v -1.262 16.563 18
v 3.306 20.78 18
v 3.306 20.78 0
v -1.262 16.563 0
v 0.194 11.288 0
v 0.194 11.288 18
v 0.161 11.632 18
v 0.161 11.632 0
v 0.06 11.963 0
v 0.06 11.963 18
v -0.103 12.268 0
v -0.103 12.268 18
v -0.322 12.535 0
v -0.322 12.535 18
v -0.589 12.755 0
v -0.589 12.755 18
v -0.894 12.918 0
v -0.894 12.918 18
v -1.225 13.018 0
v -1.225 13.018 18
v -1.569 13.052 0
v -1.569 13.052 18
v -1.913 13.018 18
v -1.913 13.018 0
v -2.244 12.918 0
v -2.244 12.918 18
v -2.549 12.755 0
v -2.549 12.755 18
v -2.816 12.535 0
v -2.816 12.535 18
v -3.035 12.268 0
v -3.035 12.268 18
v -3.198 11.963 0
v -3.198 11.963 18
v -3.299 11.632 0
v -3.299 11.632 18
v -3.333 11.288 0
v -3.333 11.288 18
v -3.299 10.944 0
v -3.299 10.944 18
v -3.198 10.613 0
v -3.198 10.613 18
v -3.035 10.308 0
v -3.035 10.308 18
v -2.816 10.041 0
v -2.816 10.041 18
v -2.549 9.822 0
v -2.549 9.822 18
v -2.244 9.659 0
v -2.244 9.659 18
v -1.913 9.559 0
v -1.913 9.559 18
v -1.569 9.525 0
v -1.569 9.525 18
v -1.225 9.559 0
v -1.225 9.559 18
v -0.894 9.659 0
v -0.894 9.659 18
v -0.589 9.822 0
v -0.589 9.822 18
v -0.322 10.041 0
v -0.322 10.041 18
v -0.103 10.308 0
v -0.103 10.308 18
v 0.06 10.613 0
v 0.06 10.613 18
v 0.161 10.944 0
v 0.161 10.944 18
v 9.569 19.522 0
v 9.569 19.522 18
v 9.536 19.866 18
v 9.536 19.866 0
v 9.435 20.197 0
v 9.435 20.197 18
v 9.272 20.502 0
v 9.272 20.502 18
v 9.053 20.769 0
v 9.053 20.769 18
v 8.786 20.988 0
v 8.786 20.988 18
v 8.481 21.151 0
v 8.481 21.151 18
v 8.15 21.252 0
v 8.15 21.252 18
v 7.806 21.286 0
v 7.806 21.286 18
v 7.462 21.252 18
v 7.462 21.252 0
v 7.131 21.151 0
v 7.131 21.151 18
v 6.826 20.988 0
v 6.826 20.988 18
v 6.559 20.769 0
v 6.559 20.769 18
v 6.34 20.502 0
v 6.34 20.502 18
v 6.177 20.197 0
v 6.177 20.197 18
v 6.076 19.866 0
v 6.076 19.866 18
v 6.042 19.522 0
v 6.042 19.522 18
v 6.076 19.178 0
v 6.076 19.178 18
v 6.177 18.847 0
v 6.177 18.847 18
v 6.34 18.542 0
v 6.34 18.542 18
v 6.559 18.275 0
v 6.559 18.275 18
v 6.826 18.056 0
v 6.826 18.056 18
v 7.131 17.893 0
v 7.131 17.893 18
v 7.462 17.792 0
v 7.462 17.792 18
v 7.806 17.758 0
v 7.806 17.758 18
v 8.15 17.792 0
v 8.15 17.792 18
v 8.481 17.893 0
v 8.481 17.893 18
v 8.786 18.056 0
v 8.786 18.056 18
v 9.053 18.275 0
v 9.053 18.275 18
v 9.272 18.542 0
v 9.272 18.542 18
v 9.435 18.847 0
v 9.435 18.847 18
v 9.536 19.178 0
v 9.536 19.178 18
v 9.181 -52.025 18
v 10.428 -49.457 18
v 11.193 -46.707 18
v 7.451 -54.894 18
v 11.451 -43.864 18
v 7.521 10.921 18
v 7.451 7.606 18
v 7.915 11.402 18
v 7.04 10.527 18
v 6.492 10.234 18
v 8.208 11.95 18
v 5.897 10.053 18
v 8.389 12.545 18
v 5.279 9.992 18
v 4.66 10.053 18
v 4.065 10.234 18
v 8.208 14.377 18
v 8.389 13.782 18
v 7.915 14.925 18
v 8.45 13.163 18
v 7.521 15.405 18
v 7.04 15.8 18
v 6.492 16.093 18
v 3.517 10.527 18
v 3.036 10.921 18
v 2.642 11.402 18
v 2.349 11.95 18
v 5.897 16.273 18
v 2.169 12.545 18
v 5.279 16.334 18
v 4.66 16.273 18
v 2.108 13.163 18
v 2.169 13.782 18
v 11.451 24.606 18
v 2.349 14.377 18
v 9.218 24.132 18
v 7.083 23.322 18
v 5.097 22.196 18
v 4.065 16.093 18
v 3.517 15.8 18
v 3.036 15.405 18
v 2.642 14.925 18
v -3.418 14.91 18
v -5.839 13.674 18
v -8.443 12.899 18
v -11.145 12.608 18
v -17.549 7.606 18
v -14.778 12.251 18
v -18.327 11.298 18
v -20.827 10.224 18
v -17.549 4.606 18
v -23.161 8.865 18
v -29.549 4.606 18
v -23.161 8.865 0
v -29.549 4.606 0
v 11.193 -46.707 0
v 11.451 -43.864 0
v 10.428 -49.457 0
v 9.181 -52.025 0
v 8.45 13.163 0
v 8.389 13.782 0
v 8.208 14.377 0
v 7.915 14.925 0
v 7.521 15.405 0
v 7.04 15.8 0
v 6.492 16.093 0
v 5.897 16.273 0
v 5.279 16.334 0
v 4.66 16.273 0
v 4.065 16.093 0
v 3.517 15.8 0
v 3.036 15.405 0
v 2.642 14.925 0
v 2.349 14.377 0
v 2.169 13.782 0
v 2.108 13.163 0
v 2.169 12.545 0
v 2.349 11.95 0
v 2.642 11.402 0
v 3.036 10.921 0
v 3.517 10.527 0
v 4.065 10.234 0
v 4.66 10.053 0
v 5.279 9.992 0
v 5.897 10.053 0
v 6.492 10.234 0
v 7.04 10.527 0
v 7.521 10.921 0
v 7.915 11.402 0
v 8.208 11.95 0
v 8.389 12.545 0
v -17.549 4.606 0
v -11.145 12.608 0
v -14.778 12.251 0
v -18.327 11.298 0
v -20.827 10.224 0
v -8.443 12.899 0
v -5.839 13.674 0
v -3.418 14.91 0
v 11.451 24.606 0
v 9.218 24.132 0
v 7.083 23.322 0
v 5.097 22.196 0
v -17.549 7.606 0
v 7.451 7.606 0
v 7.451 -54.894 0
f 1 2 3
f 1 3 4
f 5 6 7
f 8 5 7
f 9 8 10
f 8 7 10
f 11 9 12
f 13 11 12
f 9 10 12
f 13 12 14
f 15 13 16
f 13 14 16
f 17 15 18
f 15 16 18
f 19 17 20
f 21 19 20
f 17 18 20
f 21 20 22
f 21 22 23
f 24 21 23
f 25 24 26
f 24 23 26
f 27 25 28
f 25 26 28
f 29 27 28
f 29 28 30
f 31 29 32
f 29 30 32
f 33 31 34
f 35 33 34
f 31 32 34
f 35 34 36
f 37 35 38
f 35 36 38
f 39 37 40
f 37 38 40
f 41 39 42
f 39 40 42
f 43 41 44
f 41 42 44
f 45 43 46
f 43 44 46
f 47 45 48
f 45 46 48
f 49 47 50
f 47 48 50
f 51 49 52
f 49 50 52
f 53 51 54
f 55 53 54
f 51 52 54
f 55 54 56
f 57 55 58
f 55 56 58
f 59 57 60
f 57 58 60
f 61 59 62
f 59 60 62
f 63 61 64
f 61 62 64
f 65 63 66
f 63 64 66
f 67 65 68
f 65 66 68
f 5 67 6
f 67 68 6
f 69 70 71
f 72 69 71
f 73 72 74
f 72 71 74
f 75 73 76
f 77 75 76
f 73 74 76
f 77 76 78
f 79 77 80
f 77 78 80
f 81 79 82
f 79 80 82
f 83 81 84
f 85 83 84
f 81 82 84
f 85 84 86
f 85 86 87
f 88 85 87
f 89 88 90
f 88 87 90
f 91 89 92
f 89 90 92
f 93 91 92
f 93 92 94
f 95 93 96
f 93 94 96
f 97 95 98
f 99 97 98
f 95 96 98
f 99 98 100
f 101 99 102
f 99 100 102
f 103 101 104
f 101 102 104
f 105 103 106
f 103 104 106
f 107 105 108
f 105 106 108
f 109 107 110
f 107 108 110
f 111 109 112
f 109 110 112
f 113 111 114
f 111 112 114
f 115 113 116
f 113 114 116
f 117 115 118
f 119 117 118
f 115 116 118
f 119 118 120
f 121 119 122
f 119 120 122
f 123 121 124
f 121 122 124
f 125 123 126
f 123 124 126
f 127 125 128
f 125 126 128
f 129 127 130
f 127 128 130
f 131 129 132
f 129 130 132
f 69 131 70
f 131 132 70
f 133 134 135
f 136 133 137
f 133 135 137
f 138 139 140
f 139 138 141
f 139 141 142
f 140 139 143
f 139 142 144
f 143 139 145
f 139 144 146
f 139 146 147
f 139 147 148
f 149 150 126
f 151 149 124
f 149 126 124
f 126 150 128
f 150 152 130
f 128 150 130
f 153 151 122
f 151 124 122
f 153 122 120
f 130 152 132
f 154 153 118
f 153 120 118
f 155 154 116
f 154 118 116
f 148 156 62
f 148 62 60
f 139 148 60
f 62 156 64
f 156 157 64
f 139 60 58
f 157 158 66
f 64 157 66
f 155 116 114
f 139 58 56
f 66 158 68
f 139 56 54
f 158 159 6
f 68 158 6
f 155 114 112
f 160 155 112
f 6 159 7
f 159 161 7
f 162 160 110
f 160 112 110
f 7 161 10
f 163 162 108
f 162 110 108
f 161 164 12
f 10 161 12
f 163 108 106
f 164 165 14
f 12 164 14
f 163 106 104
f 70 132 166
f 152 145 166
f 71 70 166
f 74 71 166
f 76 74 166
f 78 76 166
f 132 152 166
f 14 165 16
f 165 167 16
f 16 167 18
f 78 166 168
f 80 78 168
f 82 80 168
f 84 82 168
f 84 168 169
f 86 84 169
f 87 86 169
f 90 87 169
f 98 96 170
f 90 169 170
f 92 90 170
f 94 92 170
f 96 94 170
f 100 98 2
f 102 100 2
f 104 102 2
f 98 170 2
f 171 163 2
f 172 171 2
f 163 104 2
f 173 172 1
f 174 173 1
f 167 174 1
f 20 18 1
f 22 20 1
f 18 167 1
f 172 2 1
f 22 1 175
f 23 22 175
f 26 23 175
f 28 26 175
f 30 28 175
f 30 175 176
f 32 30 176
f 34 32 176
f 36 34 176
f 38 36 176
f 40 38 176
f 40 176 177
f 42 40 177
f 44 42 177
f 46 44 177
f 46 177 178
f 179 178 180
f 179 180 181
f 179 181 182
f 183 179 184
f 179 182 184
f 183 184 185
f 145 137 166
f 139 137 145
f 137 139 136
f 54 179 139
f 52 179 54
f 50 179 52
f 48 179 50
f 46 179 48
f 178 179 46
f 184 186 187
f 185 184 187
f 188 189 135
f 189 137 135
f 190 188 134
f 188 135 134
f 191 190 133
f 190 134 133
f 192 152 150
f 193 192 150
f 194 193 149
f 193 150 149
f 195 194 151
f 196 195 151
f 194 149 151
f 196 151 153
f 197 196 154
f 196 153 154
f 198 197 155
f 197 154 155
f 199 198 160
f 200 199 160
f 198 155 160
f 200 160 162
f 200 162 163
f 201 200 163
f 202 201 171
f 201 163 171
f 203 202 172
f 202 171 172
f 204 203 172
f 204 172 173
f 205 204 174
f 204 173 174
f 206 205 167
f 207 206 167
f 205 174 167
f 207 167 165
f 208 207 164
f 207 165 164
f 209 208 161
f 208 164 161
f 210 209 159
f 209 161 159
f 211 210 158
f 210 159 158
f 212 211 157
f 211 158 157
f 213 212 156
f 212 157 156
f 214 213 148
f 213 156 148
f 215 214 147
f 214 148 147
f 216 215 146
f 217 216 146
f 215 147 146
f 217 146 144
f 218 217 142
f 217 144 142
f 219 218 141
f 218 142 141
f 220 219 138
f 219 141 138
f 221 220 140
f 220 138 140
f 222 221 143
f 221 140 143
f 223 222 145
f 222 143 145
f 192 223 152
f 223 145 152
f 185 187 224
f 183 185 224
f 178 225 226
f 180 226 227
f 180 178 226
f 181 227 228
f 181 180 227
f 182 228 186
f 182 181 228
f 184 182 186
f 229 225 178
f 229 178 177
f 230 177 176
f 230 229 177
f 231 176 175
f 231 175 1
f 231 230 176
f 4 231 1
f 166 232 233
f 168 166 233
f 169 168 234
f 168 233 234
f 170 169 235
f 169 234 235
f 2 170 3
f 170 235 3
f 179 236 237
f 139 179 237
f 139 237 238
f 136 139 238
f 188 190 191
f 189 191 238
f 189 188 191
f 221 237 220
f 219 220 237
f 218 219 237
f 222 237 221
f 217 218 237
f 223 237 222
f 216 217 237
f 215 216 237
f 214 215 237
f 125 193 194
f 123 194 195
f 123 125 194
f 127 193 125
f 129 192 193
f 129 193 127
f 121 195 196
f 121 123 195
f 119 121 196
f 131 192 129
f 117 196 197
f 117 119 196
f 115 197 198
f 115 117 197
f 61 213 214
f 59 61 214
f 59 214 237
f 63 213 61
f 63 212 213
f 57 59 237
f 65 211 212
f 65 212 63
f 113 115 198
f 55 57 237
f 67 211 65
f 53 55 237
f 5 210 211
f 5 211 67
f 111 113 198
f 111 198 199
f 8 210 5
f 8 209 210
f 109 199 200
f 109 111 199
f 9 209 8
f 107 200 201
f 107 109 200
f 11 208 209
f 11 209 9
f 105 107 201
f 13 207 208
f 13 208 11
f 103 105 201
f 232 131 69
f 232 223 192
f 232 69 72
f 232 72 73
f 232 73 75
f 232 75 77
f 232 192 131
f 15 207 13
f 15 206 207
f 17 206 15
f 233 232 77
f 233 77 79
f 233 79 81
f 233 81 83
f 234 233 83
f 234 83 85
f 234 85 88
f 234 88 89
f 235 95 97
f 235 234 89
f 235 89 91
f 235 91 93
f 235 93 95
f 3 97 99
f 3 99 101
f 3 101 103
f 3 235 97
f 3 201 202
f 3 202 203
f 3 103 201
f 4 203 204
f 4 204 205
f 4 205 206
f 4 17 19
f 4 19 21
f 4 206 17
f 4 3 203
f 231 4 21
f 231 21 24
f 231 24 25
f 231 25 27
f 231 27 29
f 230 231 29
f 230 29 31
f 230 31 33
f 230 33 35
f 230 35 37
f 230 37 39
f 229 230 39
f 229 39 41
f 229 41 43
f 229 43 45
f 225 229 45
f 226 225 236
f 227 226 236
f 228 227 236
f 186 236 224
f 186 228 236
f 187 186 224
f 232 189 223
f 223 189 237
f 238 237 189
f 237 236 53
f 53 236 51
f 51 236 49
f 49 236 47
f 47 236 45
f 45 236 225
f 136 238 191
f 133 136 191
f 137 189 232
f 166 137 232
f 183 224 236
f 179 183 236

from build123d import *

# Parameters (mm, degrees)
F1_DEPTH    = 18
F2_T1_DEPTH = 18
F2_T3_DEPTH = 46.2017417965
F3_R        = 22.3056916506
F4_R        = 15.8040911287
F5_R        = 1.7635852265
F5_R_2      = 3.1709752344
F6_DEPTH    = 18


# Not quite as in the source:
# - a fillet or chamfer that OpenCascade refuses, or shapes differently, is made with other operations: its cross-section is extruded or revolved along the edge and cut away or added


with BuildPart() as f1:
    # F0 (on Top) → F1 (new body)
    with BuildSketch(Plane.XY):
        Polygon((-17.5491029148, 7.6061424899), (7.4508970852, 7.6061424899), (7.4508970852, -54.8938575101), (11.4508970852, -48.259973526), (11.4508970852, 24.6061424899), (7.4508970852, 24.6061424899), (-5.5491029148, 12.6061424899), (-17.5491029148, 12.6061424899), (-29.5491029148, 4.6061424899), (-17.5491029148, 4.6061424899), align=None)
    extrude(amount=F1_DEPTH)

    # F2: fillet of radius 14.9219158343 on 2 edges, made by hand

    # F2_s2 → F2_t1 (join)
    with BuildSketch(Plane.XY):
        with BuildLine():
            ThreePointArc((-11.3833307845, 12.6061424899), (-5.9496574254, 13.6306209347), (-1.2620921794, 16.5633831687))
            Line((-1.2620921794, 16.5633831687), (-5.5491029148, 12.6061424899))
            Line((-5.5491029148, 12.6061424899), (-11.3833307845, 12.6061424899))
        make_face()
    extrude(amount=F2_T1_DEPTH)

    # F2_s4 → F2_t3 (cut)
    with BuildSketch(Plane.XY.offset(-14.1008708982)):
        with BuildLine():
            ThreePointArc((11.4508970852, 24.6061424899), (7.0833751355, 23.32182366), (3.3063496819, 20.7804064253))
            Line((3.3063496819, 20.7804064253), (7.4508970852, 24.6061424899))
            Line((7.4508970852, 24.6061424899), (11.4508970852, 24.6061424899))
        make_face()
    extrude(amount=F2_T3_DEPTH, mode=Mode.SUBTRACT)

    # F3
    f3_edges = [f1.edges().sort_by_distance(p)[0] for p in [
        (-17.549103, 12.606142, 9),
    ]]
    fillet(f3_edges, radius=F3_R)

    # F4
    f4_edges = [f1.edges().sort_by_distance(p)[0] for p in [
        (11.450897, -48.259974, 9),
    ]]
    fillet(f4_edges, radius=F4_R)

    # F5 (on face) → F6 (cut)
    with BuildSketch(Plane.XY.offset(18)):
        with Locations((-1.5691251028, 11.2882275134)):
            Circle(F5_R)
        with Locations((5.2787014283, 13.1632275879)):
            Circle(F5_R_2)
        with Locations((7.8058750369, 19.5219237357)):
            Circle(F5_R)
    extrude(amount=-F6_DEPTH, mode=Mode.SUBTRACT)


solid = f1.part
